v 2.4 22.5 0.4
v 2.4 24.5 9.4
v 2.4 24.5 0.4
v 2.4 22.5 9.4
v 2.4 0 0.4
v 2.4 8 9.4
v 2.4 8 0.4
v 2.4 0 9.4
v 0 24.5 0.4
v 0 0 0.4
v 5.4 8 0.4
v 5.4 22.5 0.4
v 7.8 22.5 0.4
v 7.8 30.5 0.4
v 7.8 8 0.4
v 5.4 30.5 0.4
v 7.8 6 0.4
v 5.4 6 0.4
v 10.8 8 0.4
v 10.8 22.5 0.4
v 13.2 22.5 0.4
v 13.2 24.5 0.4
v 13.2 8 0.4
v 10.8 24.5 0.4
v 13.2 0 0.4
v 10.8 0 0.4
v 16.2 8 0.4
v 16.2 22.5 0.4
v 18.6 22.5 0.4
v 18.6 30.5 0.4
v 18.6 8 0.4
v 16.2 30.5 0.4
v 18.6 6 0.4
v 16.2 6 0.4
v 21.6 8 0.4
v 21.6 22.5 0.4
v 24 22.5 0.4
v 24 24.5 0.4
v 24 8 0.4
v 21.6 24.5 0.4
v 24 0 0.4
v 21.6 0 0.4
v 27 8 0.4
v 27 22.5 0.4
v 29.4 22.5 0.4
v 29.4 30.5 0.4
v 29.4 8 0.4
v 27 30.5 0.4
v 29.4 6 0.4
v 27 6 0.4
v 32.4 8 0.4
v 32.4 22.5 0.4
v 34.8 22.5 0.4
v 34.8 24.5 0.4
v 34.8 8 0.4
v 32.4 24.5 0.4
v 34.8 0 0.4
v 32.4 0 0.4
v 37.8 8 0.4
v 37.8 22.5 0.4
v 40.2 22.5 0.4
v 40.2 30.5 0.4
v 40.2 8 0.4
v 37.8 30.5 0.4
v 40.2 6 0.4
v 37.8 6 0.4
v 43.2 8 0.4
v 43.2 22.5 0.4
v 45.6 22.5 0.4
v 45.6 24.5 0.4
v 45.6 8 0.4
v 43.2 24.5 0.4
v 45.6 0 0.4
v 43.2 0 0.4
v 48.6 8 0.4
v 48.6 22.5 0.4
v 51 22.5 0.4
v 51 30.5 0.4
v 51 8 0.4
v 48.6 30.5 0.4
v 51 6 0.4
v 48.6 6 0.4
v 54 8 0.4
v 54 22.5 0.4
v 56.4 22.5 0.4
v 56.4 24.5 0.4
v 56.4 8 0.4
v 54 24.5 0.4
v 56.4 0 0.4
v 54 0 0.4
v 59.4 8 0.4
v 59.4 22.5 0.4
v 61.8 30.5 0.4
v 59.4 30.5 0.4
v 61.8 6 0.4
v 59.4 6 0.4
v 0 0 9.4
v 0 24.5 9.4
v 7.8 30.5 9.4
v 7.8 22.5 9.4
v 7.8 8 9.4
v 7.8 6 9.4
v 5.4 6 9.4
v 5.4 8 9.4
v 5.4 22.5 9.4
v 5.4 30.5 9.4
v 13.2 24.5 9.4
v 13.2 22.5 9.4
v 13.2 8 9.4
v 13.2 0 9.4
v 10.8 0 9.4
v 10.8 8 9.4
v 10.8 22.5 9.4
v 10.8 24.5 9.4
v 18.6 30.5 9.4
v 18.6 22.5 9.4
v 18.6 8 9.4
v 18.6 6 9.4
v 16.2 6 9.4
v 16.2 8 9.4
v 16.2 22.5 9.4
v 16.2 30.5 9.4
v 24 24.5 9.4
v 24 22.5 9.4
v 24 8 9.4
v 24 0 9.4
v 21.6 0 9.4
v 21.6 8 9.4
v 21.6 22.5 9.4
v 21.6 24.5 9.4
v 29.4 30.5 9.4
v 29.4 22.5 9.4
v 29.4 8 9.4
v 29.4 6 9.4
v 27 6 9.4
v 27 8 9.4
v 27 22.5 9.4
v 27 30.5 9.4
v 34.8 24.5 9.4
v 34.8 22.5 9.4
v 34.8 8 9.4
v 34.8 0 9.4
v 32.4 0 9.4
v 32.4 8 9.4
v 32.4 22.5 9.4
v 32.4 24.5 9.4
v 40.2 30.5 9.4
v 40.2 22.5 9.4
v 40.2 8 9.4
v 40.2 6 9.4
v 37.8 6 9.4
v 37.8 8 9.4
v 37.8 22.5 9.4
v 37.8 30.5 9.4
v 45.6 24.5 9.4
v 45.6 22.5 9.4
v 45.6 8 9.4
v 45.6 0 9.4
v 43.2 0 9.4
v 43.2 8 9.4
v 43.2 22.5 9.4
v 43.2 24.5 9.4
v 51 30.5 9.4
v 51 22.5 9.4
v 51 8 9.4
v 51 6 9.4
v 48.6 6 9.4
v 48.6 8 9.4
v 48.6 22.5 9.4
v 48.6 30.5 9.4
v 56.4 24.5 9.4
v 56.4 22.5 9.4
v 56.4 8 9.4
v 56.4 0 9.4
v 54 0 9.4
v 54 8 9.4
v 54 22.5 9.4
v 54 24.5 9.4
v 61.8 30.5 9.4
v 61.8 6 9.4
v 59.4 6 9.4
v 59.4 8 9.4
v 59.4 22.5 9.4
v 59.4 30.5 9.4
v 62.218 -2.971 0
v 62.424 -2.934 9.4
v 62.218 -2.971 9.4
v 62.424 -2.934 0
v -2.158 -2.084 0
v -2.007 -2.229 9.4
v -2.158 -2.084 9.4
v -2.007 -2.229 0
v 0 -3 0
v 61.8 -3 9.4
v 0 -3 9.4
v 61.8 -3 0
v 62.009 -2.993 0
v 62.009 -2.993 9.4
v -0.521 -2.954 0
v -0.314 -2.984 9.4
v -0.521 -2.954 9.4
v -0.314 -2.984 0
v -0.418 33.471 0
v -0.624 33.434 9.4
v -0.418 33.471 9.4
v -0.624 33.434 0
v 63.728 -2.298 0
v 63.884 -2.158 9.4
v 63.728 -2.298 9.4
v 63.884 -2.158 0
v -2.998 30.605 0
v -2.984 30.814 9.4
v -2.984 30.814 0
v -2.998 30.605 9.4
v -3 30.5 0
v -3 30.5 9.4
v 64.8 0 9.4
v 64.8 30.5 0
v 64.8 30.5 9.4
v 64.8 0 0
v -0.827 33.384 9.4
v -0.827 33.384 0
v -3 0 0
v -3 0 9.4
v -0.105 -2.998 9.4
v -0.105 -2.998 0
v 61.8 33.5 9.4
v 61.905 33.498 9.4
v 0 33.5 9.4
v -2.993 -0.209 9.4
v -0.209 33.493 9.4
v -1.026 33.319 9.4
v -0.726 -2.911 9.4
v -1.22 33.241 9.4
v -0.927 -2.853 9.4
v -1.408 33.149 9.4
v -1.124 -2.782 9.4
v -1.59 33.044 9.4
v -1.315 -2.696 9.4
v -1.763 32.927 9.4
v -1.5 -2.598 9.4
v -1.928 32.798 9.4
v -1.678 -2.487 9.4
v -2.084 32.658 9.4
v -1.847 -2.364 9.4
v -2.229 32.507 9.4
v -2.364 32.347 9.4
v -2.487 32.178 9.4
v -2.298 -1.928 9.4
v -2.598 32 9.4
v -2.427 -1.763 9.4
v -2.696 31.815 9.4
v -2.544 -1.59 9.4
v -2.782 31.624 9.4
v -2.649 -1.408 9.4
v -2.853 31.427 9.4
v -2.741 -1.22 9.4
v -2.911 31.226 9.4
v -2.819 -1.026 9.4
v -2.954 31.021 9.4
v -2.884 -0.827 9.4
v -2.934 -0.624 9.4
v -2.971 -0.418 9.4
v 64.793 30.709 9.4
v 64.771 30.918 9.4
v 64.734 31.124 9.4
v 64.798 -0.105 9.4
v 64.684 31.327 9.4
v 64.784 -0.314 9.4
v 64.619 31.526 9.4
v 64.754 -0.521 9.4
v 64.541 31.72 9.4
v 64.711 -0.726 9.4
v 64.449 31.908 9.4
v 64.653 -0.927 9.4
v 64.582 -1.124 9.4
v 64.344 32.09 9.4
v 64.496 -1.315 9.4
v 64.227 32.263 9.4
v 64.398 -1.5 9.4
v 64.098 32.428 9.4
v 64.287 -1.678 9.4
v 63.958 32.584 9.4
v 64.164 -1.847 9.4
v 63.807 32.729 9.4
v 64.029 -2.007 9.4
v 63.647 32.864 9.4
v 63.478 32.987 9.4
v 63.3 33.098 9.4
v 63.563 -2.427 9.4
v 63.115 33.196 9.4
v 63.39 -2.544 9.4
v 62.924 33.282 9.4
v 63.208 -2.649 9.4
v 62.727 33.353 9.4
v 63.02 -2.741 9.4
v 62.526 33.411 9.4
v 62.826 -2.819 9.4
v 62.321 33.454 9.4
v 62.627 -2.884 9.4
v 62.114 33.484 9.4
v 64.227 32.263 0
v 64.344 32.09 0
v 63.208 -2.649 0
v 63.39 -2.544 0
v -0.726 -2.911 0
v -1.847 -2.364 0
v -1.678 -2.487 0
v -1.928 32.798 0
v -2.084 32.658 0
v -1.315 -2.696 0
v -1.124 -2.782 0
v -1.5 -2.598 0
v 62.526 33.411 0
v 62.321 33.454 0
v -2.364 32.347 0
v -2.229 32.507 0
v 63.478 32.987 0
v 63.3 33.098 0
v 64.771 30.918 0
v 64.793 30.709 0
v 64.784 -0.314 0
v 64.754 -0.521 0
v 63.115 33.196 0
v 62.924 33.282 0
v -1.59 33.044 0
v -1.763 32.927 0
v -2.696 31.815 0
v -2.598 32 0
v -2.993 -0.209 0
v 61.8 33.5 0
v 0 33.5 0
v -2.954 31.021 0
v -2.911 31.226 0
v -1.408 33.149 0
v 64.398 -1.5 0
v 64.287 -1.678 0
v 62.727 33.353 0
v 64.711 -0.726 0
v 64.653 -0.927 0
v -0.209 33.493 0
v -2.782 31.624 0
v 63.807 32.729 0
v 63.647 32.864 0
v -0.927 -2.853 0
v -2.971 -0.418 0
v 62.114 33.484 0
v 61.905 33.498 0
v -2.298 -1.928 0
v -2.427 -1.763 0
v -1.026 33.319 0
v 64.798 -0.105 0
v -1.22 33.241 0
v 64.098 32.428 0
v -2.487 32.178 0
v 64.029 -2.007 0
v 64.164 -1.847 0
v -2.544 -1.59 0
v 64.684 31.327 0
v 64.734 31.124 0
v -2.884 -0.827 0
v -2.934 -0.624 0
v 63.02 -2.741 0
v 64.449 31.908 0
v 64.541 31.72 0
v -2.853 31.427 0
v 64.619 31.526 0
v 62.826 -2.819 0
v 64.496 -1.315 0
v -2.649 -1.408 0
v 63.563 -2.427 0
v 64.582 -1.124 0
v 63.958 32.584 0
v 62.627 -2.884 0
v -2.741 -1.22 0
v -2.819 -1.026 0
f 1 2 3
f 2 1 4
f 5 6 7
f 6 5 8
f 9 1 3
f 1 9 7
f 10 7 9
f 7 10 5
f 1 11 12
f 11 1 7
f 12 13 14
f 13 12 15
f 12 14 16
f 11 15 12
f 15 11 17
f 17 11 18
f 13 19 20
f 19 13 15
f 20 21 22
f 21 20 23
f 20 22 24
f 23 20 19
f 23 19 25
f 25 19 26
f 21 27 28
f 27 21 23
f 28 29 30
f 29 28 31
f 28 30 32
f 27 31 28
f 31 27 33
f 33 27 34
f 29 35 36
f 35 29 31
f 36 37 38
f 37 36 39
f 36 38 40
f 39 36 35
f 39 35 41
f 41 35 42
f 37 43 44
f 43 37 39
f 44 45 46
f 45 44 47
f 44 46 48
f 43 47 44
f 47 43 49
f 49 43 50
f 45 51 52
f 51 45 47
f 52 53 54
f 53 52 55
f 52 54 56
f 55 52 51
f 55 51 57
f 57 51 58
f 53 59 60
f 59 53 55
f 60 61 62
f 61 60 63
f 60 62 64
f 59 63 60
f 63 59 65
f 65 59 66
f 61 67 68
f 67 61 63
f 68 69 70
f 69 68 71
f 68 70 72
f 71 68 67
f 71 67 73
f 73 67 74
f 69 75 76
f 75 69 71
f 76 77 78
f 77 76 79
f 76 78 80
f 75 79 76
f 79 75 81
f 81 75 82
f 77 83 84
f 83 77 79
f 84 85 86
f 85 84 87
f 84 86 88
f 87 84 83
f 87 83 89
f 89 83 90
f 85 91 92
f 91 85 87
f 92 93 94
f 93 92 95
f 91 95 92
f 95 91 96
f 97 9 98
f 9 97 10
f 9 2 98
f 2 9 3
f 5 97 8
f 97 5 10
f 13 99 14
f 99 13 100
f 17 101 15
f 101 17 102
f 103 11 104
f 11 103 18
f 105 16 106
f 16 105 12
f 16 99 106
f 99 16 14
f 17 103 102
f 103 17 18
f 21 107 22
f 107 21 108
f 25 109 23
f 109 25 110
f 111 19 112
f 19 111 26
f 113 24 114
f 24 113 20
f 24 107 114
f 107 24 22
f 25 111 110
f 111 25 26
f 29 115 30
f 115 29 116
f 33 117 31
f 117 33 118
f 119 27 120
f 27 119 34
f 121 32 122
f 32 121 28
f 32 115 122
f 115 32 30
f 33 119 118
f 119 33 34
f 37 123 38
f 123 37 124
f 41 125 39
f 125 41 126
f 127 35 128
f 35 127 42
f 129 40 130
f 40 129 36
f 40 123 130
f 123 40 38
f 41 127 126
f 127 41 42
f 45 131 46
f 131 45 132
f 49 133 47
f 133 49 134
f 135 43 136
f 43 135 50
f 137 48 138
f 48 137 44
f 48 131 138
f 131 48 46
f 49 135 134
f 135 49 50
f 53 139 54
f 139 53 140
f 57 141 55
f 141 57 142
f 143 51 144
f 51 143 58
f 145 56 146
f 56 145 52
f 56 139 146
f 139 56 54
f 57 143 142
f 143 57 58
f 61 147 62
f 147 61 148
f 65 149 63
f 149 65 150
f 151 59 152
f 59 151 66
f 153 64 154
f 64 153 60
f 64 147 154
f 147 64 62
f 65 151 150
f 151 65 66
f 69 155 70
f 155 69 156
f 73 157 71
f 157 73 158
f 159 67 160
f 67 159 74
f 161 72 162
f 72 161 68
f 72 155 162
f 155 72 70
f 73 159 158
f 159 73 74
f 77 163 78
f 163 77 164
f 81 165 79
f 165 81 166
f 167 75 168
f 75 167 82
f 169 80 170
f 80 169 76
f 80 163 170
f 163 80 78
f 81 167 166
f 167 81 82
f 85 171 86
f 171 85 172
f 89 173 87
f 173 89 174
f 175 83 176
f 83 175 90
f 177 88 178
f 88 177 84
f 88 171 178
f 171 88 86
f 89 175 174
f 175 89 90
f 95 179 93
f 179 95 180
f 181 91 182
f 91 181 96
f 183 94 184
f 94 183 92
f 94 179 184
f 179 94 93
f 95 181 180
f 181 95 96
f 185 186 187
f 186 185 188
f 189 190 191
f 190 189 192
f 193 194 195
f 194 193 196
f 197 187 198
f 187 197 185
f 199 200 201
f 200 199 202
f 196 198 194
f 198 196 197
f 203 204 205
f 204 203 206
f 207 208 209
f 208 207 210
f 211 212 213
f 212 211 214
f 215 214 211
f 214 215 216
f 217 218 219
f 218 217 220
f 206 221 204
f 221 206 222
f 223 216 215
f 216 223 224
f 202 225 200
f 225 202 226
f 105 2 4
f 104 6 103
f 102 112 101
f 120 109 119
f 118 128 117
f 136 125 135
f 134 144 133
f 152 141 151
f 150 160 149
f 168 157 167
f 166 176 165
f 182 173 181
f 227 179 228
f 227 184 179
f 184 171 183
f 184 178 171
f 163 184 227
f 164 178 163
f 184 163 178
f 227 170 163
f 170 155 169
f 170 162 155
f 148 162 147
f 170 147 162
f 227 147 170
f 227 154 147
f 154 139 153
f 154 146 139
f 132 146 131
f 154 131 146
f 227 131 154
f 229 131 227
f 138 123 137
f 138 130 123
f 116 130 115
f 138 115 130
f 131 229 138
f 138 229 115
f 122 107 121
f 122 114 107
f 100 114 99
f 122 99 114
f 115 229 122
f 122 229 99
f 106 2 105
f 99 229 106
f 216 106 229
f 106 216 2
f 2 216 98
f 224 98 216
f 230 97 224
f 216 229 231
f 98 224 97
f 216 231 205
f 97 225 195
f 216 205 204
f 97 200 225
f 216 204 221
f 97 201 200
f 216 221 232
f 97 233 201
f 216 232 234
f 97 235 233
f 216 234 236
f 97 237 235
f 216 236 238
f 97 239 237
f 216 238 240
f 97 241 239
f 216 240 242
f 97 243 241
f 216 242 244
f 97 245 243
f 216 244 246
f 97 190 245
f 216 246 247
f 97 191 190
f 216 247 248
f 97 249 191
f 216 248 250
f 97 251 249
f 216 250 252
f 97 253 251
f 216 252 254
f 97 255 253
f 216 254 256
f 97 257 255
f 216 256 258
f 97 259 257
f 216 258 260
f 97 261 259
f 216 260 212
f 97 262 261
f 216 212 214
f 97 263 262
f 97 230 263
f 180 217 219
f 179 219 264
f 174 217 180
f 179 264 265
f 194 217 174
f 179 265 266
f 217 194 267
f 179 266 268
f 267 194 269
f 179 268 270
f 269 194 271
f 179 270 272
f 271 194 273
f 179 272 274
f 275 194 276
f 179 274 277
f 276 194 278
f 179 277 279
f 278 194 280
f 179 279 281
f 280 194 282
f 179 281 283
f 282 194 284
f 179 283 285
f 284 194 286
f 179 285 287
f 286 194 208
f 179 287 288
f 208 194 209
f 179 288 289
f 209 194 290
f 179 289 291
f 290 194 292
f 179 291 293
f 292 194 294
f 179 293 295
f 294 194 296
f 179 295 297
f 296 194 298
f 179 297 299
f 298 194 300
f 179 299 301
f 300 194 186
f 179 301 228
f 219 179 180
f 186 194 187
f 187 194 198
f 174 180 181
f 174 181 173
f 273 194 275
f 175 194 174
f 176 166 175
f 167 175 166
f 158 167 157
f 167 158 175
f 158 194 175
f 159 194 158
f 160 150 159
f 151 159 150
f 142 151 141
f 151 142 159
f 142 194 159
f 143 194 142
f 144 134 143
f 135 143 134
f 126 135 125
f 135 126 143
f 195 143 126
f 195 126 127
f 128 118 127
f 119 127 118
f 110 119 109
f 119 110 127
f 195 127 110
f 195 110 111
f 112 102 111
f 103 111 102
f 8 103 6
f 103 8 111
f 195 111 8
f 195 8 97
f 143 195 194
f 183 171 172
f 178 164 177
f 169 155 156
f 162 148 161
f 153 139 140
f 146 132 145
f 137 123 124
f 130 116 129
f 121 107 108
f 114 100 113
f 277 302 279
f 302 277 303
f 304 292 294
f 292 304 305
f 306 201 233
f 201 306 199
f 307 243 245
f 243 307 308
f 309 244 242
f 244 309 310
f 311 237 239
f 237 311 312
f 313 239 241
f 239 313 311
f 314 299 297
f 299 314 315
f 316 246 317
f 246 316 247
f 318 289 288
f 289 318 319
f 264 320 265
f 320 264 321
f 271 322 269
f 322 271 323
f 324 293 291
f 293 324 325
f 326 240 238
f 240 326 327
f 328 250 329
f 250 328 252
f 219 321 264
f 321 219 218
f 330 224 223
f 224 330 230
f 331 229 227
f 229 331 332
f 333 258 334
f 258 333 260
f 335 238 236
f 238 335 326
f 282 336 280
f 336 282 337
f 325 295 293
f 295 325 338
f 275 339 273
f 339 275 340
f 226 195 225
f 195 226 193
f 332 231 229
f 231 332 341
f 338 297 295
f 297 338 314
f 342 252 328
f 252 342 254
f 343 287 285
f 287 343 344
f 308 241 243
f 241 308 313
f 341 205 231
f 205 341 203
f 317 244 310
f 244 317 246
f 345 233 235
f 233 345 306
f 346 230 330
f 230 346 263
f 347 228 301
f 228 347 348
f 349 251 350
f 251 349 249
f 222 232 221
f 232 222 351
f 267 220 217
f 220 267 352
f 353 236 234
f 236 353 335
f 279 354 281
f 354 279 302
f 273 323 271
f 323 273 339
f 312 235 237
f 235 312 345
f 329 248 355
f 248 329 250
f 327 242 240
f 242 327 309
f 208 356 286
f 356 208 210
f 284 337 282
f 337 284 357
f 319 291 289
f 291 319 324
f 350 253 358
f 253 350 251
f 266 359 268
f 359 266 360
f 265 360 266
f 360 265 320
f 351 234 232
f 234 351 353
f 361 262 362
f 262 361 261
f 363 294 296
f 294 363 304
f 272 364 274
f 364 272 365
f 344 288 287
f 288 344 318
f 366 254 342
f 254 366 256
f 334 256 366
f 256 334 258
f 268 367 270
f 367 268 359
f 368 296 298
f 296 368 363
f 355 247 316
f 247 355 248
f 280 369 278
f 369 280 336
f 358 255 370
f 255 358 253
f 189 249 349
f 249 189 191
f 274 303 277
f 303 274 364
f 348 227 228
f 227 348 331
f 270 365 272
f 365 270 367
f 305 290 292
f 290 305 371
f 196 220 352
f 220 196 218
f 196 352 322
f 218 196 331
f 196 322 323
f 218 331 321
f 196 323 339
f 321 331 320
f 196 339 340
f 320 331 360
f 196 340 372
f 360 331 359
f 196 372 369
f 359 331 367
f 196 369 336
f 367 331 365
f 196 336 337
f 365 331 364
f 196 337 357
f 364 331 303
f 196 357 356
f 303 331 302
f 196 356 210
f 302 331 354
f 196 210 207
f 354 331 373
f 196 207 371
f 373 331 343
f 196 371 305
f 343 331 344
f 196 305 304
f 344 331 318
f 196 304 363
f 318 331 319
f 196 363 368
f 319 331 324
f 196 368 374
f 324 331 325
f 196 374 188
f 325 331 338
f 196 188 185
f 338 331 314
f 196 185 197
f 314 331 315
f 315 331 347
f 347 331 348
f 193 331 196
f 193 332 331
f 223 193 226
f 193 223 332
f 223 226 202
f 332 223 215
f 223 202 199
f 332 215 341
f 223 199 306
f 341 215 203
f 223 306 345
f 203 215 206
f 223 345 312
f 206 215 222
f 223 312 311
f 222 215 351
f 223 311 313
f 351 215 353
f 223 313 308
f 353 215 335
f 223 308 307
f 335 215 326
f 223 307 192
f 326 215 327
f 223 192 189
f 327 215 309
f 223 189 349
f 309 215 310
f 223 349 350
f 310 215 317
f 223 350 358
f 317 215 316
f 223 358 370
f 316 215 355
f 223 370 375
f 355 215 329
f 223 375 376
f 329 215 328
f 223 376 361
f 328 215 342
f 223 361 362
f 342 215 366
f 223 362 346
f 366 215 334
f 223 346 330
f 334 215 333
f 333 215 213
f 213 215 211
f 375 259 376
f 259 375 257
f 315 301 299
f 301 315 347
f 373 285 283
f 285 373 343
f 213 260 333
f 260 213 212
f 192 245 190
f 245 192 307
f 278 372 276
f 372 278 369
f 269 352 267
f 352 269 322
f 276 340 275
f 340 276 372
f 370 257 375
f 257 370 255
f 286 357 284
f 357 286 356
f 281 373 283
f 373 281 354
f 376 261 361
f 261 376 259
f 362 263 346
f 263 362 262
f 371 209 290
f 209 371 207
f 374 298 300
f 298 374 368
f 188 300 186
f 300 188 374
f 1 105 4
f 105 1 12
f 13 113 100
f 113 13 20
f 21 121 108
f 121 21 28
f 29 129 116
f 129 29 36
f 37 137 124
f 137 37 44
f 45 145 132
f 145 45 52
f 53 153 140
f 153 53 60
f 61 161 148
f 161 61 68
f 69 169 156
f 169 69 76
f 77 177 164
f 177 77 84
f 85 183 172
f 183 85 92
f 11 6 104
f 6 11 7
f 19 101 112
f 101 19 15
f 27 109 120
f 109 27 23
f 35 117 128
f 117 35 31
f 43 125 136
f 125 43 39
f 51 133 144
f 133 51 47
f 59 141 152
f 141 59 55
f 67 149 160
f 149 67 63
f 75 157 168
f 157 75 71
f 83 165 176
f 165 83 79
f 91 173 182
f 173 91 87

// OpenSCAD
/*
 * SD Card Holder
 *
 * Author: Pavel Rampas
 * Version: 1.0.0 (Changelog is at the bottom)
 * License: CC BY-SA 4.0 [https://creativecommons.org/licenses/by-sa/4.0/]
 * Link: https://github.com/pavelrampas/openscad-models
 *
 * OpenSCAD version: 2019.05
 *
 * Instructions:
 * Set up parameters, render and print.
 *
 * Height is layer.
 * Thickness is perimeter.
 */

// Parameters
//------------------------------------------------------------------------------

$fn = $preview ? 15 : 90;

sdNumber = 12; // even number
sdWidth = 24.5;
sdThickness = 2.4;

thickness = 3; // space between cards
baseHeight = 0.4; // height under cards
height = 9; // height around cards

dispersion = 6;

// Code
//------------------------------------------------------------------------------

difference() {
    _base();

    for (i = [0:((sdNumber / 2) - 1)]) {
        // left line
        translate([i * ((sdThickness + thickness) * 2), 0, baseHeight]) {
            _sd_card();
        }

        // right line
        translate([
            (i * ((sdThickness + thickness) * 2)) + (sdThickness + thickness),
            dispersion,
            baseHeight
        ]) {
            _sd_card();
        }
    }

    // center space
    translate([0, dispersion + 2, baseHeight]) {
        cube([
            ((sdThickness + thickness) * sdNumber) - thickness,
            sdWidth - (dispersion + 4),
            baseHeight + height
        ]);
    }
}

// Functions
//------------------------------------------------------------------------------

// Modules
//------------------------------------------------------------------------------

module _sd_card() {
    cube([sdThickness, sdWidth, height + 10]);
}

module _base() {
    linear_extrude(baseHeight + height) {
        offset(r = 3) {
            square([
                ((sdThickness + thickness) * sdNumber) - thickness,
                sdWidth + dispersion
            ]);
        }
    }
}

// Changelog
//------------------------------------------------------------------------------

// [1.0.0]:
// Initial release.
